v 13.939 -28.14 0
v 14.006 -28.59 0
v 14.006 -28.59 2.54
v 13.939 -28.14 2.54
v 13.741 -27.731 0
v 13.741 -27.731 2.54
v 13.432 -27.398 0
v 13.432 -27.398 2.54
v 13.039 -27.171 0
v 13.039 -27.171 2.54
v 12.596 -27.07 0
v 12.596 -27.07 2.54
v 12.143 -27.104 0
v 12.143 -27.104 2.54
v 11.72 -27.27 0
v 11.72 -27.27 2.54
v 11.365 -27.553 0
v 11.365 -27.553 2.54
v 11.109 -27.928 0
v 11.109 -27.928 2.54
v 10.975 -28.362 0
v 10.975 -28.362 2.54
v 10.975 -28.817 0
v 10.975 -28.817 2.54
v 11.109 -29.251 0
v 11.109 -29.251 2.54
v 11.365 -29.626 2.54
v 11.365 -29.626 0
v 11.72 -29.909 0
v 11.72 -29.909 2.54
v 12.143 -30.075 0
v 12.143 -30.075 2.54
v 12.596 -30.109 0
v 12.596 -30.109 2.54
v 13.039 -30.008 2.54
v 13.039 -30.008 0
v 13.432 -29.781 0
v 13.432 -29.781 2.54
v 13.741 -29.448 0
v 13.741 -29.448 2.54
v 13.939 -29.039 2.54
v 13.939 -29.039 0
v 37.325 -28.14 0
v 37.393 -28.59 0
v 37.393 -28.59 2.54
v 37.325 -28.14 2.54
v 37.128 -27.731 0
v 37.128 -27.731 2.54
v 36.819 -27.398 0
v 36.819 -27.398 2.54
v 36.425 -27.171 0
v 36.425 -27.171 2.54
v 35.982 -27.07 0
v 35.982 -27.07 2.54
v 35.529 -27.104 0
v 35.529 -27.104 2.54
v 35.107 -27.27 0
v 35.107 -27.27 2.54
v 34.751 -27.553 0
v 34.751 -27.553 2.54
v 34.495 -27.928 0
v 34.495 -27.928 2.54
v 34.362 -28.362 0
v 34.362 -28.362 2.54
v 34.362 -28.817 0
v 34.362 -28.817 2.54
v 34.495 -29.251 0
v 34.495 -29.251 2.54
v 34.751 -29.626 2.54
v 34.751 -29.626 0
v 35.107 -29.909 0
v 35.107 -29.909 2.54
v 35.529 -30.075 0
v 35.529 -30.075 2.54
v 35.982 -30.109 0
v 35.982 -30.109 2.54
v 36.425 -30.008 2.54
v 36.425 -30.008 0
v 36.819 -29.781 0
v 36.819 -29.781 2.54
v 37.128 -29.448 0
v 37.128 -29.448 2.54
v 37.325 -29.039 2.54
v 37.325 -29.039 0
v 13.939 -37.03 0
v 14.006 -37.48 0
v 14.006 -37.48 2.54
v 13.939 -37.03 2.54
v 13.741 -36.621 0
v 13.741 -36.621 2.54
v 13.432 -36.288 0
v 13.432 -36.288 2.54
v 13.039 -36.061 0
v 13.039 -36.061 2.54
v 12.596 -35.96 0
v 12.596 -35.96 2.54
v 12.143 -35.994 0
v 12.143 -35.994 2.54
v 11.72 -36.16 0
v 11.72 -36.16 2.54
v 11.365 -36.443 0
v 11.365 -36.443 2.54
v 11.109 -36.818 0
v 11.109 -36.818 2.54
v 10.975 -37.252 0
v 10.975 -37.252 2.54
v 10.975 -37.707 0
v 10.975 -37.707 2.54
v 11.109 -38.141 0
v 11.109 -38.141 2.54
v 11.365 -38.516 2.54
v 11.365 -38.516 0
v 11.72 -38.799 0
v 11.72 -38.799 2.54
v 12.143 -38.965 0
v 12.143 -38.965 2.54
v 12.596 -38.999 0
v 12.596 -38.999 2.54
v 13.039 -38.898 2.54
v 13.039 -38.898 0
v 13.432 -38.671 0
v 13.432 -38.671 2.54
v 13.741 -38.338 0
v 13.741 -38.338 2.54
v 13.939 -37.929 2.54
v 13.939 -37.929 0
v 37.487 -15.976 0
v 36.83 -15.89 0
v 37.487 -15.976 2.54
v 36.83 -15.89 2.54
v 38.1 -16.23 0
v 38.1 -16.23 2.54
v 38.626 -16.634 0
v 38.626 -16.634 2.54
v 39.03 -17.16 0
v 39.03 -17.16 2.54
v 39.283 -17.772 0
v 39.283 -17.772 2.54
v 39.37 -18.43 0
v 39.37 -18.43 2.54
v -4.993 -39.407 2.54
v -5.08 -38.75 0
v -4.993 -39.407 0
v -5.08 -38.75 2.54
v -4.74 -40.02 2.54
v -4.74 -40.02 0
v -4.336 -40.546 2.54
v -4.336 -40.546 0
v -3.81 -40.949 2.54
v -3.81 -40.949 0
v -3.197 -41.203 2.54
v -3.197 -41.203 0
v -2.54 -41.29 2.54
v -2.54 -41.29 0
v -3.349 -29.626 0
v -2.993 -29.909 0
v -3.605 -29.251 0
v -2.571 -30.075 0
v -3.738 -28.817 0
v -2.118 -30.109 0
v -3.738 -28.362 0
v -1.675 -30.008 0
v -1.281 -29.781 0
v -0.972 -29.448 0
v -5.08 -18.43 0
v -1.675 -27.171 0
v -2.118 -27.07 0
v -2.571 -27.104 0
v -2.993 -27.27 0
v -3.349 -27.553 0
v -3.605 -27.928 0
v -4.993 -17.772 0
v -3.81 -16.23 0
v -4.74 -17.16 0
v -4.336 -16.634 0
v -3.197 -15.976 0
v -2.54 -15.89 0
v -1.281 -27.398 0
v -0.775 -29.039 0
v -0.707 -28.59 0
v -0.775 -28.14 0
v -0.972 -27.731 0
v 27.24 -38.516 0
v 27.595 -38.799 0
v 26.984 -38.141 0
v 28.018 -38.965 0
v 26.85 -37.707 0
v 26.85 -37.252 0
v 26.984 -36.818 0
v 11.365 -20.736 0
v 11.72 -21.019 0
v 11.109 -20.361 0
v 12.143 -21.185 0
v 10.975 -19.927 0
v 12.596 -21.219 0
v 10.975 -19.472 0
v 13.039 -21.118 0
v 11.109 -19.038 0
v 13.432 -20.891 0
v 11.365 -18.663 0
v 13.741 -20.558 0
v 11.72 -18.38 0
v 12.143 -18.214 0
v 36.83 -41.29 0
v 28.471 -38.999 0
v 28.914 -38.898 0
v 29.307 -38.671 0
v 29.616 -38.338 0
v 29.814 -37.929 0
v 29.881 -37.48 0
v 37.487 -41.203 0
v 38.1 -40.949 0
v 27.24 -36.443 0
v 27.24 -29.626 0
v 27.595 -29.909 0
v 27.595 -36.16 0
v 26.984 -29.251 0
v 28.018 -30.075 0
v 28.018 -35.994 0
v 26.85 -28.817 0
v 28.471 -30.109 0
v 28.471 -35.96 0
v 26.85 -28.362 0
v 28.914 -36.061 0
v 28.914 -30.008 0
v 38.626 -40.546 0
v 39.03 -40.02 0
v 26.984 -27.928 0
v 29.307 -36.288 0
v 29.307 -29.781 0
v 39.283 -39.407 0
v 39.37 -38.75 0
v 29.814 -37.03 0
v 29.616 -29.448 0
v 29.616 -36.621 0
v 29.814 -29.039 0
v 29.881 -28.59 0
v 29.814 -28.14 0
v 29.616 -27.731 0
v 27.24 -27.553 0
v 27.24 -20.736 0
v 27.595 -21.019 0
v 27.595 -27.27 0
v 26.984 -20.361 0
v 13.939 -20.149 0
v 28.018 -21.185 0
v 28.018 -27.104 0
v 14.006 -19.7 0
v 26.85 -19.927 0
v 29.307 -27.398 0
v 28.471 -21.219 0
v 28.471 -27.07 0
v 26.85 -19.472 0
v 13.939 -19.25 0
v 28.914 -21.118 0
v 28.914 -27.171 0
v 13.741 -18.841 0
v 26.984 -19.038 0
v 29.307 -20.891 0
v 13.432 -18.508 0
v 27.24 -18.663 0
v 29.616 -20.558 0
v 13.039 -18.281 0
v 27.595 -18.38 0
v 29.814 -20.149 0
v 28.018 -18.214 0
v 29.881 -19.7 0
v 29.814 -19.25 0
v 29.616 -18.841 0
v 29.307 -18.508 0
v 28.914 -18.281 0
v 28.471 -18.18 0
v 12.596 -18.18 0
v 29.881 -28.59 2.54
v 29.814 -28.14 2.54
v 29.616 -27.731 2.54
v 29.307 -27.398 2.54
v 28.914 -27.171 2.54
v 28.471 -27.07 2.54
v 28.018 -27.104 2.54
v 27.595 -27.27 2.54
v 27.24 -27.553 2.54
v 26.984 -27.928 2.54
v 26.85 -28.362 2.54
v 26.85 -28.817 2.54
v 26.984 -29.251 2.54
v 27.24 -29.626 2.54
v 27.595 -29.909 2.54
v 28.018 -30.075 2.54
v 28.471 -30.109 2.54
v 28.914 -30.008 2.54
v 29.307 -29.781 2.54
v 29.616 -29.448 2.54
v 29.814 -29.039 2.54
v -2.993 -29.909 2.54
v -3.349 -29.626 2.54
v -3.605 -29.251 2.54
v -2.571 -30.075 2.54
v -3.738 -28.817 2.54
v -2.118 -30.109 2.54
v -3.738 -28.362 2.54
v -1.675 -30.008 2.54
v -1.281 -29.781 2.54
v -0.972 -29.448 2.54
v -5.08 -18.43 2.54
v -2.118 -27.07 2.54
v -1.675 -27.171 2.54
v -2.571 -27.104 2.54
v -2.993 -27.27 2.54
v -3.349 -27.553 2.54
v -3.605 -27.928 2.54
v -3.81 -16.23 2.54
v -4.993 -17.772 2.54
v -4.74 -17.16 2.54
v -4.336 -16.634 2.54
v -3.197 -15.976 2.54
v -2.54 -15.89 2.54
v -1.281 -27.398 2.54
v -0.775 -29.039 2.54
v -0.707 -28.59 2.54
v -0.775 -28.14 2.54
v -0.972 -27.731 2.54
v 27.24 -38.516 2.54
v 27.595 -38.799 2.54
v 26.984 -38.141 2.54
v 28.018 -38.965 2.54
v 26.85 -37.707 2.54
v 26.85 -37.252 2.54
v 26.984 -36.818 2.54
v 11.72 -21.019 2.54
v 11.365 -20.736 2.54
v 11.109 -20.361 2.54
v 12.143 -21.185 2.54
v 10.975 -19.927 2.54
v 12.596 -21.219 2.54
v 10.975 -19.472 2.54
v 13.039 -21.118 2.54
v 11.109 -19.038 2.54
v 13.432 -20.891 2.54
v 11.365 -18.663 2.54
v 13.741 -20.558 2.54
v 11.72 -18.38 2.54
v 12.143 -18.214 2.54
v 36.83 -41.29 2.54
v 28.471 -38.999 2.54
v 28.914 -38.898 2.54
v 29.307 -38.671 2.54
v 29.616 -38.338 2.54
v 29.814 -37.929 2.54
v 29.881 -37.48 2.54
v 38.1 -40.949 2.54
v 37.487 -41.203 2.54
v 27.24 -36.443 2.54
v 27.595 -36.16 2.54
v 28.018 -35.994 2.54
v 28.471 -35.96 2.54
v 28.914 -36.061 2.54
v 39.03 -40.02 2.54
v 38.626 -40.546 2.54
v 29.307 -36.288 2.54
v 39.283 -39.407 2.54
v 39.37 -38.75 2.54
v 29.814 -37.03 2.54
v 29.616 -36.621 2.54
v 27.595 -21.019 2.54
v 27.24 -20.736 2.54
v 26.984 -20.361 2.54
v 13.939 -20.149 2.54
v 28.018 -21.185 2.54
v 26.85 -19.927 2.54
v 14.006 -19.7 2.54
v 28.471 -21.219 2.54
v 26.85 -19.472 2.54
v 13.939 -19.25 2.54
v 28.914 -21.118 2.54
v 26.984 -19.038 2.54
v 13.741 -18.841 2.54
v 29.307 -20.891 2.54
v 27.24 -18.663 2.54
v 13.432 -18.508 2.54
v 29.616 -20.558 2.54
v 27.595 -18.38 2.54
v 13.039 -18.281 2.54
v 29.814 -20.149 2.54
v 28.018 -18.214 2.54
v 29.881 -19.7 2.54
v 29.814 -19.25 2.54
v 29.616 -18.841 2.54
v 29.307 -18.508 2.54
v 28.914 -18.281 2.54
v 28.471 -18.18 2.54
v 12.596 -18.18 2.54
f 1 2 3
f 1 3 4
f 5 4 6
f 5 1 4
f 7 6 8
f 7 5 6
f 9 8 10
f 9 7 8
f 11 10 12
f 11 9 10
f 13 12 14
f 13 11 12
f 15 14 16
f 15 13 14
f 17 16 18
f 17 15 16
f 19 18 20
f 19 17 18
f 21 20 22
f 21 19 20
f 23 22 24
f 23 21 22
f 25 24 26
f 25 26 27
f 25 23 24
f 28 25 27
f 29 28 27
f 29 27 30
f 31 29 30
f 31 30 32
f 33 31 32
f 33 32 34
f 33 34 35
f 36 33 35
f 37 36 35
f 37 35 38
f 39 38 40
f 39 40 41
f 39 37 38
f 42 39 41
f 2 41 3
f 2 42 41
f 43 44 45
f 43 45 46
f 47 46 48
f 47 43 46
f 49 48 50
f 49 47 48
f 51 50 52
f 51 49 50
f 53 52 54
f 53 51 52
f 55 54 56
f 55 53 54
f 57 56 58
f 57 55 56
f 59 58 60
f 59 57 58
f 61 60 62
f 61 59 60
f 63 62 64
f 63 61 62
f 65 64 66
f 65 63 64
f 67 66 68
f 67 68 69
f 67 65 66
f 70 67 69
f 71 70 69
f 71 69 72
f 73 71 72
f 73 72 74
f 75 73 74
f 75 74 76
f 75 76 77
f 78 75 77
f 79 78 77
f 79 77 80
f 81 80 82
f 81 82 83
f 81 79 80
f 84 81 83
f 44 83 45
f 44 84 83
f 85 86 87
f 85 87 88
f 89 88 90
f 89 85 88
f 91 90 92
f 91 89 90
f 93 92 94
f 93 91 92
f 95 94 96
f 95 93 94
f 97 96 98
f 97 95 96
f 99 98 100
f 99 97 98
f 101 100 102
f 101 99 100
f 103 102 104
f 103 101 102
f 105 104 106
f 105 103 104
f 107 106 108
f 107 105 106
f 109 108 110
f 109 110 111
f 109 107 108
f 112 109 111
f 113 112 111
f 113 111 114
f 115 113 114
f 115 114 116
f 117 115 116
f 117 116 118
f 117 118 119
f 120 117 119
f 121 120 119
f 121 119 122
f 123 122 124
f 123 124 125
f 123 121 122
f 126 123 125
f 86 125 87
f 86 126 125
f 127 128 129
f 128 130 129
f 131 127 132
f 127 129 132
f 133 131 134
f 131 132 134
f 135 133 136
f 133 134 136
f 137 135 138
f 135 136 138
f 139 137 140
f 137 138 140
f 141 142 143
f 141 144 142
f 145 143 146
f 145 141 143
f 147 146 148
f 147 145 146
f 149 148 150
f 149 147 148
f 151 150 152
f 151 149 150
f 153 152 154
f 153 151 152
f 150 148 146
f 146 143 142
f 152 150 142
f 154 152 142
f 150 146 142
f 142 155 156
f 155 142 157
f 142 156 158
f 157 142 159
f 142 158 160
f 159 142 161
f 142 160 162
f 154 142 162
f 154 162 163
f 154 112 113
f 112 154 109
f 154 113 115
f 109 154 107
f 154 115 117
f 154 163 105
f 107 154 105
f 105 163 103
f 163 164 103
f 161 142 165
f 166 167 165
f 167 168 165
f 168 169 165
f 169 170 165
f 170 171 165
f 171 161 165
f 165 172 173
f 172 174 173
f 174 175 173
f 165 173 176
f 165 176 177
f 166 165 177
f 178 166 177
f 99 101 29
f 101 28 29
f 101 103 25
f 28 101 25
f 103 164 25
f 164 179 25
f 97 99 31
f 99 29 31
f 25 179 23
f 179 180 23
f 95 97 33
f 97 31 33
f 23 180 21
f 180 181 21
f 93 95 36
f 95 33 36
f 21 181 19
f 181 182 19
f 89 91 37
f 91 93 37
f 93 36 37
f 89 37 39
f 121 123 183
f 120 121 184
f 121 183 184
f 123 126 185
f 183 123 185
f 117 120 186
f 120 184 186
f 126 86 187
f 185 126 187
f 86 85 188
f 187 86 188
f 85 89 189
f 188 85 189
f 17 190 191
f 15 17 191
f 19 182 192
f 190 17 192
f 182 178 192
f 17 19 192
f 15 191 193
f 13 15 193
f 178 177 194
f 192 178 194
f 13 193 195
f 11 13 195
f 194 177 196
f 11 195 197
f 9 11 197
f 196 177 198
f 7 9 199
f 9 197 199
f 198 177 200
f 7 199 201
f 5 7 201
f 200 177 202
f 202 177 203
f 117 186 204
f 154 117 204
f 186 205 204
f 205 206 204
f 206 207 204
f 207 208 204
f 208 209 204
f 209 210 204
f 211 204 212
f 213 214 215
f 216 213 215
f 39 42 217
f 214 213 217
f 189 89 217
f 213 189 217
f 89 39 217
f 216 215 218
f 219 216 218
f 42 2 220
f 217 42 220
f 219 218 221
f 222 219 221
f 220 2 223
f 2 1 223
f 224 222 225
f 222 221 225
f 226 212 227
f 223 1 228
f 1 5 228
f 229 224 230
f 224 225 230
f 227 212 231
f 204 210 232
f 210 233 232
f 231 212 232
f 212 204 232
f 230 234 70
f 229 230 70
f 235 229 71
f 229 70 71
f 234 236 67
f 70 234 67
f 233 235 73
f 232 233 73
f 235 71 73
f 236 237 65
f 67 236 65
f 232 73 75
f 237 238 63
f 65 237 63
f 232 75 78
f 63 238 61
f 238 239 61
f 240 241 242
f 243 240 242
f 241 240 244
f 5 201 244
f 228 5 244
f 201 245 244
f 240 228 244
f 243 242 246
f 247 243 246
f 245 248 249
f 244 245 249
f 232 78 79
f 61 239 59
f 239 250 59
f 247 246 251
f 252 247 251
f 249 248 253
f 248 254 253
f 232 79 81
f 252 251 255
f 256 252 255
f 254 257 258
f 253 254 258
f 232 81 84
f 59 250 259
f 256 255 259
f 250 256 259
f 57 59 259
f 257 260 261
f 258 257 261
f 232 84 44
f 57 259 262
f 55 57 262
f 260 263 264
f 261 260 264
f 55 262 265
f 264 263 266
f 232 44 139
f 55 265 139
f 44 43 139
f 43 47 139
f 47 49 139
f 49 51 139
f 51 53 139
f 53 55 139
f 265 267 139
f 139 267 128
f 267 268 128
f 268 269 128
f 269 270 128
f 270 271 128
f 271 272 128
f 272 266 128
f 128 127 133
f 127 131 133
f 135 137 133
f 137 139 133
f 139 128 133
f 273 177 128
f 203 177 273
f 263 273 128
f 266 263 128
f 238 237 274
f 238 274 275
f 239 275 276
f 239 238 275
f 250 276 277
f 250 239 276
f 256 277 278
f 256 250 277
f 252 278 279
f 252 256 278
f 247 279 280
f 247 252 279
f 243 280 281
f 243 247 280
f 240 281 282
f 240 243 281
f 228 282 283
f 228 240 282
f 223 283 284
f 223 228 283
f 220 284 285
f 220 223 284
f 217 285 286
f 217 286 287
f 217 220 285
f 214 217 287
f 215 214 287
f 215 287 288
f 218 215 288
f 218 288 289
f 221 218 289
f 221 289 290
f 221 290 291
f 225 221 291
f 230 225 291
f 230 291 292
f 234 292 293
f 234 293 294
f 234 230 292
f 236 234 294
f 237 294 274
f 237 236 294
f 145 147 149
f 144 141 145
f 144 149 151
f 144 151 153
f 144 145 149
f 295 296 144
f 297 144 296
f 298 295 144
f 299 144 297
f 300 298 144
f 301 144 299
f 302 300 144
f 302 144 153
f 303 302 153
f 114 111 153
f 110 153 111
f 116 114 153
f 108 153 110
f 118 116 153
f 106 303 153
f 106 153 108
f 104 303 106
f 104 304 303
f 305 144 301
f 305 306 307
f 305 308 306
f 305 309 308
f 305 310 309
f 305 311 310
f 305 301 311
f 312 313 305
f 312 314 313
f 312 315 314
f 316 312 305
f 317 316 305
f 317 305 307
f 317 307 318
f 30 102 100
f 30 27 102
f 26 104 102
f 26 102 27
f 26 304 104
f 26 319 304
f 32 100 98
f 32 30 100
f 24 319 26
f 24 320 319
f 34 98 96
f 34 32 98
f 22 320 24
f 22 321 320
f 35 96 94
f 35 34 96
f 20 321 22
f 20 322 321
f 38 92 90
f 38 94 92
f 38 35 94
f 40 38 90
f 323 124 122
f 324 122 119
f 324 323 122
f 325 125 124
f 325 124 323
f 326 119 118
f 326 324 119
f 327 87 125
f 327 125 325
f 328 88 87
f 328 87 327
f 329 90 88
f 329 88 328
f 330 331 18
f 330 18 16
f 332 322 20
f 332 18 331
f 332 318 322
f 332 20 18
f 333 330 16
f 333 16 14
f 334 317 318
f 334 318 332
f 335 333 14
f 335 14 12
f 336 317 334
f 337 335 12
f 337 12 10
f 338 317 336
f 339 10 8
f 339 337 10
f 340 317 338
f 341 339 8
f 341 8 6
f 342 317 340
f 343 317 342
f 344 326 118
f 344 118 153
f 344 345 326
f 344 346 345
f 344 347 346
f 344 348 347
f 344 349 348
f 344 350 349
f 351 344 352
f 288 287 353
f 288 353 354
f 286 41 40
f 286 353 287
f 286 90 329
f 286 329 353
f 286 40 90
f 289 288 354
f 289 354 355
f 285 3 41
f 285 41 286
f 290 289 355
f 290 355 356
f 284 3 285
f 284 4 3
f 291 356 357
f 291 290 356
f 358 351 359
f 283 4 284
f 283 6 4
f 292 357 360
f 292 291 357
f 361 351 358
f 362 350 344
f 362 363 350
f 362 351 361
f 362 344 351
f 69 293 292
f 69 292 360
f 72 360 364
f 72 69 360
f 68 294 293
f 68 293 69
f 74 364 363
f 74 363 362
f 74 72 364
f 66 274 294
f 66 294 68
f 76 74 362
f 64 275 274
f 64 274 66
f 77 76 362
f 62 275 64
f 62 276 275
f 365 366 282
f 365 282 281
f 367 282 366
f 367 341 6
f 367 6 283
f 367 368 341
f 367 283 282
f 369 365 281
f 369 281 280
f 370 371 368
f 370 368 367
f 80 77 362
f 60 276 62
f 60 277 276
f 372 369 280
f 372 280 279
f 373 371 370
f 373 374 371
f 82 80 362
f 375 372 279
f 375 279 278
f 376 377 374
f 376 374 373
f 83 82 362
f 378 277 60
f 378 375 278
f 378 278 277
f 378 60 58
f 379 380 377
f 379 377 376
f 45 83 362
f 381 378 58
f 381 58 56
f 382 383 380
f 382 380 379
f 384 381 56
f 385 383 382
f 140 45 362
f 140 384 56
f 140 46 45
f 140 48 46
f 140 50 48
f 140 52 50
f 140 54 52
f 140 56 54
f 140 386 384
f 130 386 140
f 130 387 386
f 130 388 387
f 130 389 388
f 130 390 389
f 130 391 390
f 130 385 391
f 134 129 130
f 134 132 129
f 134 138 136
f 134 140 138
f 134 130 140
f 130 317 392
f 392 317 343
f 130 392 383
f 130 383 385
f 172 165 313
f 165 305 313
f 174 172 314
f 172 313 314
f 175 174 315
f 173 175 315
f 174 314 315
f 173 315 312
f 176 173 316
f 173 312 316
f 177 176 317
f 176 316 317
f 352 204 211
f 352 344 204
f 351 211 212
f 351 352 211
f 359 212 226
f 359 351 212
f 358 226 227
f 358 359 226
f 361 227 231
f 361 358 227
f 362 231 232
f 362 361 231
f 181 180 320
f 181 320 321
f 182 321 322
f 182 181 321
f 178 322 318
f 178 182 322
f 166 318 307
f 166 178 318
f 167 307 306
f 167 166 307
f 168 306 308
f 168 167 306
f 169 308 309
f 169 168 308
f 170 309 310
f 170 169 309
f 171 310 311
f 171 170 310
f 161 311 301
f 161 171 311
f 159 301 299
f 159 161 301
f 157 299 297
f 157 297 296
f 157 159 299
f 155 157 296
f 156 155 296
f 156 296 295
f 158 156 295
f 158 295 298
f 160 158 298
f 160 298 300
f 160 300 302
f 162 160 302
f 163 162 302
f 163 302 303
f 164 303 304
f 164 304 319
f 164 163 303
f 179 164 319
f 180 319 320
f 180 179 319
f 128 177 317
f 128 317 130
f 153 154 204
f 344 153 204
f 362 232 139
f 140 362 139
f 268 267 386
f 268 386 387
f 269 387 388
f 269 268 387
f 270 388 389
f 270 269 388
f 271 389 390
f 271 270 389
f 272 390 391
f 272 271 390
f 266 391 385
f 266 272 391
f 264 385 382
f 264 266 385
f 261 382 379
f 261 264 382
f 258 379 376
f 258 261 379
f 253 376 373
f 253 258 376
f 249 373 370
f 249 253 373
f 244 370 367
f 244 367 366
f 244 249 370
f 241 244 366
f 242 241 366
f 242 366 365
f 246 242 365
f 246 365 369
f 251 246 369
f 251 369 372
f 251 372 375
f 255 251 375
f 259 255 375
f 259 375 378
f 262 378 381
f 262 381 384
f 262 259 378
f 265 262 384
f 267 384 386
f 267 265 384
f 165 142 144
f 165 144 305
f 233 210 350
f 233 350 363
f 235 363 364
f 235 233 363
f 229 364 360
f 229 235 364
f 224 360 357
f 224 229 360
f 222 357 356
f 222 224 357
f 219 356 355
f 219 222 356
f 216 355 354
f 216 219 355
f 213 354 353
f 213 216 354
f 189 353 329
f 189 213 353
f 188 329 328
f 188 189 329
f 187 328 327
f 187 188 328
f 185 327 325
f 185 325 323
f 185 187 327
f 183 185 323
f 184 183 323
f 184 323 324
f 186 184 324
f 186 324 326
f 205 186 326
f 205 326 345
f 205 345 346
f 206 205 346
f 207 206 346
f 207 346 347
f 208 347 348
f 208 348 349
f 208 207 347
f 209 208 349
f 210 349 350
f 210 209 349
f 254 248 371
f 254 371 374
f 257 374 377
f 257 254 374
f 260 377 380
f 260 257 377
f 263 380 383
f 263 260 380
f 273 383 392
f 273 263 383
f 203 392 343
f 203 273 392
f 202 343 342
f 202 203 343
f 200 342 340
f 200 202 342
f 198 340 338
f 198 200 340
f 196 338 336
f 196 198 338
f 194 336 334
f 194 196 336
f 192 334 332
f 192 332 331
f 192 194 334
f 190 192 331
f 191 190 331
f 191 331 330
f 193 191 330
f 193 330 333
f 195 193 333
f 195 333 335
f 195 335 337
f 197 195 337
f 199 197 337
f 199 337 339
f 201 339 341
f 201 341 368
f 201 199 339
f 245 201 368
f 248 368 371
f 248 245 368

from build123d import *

# Parameters (mm, degrees)
SKETCH1_W           = 44.45
SKETCH1_H           = 25.4
SKETCH1_R           = 1.524
BOSS_EXTRUDE1_DEPTH = 2.54
FILLET1_R           = 2.54


with BuildPart() as part:
    # Sketch1 → Boss-Extrude1 (new body)
    with BuildSketch(Plane.XY):
        with Locations((17.145, -28.589614644)):
            Rectangle(SKETCH1_W, SKETCH1_H)
        with Locations((12.482257686, -28.589614644)):
            Circle(SKETCH1_R, mode=Mode.SUBTRACT)
        with Locations((28.357257686, -28.589614644)):
            Circle(SKETCH1_R, mode=Mode.SUBTRACT)
        with Locations((12.482257686, -19.699614644)):
            Circle(SKETCH1_R, mode=Mode.SUBTRACT)
        with Locations((28.357257686, -19.699614644)):
            Circle(SKETCH1_R, mode=Mode.SUBTRACT)
        with Locations((12.482257686, -37.479614644)):
            Circle(SKETCH1_R, mode=Mode.SUBTRACT)
        with Locations((28.357257686, -37.479614644)):
            Circle(SKETCH1_R, mode=Mode.SUBTRACT)
        with Locations((-2.231491516, -28.589614644)):
            Circle(SKETCH1_R, mode=Mode.SUBTRACT)
        with Locations((35.868508484, -28.589614644)):
            Circle(SKETCH1_R, mode=Mode.SUBTRACT)
    extrude(amount=BOSS_EXTRUDE1_DEPTH)

    # Fillet1
    fillet1_edges = [part.edges().sort_by_distance(p)[0] for p in [
        (-5.08, -15.889614644, 1.27),
        (39.37, -15.889614644, 1.27),
        (39.37, -41.289614644, 1.27),
        (-5.08, -41.289614644, 1.27),
    ]]
    fillet(fillet1_edges, radius=FILLET1_R)


solid = part.part
